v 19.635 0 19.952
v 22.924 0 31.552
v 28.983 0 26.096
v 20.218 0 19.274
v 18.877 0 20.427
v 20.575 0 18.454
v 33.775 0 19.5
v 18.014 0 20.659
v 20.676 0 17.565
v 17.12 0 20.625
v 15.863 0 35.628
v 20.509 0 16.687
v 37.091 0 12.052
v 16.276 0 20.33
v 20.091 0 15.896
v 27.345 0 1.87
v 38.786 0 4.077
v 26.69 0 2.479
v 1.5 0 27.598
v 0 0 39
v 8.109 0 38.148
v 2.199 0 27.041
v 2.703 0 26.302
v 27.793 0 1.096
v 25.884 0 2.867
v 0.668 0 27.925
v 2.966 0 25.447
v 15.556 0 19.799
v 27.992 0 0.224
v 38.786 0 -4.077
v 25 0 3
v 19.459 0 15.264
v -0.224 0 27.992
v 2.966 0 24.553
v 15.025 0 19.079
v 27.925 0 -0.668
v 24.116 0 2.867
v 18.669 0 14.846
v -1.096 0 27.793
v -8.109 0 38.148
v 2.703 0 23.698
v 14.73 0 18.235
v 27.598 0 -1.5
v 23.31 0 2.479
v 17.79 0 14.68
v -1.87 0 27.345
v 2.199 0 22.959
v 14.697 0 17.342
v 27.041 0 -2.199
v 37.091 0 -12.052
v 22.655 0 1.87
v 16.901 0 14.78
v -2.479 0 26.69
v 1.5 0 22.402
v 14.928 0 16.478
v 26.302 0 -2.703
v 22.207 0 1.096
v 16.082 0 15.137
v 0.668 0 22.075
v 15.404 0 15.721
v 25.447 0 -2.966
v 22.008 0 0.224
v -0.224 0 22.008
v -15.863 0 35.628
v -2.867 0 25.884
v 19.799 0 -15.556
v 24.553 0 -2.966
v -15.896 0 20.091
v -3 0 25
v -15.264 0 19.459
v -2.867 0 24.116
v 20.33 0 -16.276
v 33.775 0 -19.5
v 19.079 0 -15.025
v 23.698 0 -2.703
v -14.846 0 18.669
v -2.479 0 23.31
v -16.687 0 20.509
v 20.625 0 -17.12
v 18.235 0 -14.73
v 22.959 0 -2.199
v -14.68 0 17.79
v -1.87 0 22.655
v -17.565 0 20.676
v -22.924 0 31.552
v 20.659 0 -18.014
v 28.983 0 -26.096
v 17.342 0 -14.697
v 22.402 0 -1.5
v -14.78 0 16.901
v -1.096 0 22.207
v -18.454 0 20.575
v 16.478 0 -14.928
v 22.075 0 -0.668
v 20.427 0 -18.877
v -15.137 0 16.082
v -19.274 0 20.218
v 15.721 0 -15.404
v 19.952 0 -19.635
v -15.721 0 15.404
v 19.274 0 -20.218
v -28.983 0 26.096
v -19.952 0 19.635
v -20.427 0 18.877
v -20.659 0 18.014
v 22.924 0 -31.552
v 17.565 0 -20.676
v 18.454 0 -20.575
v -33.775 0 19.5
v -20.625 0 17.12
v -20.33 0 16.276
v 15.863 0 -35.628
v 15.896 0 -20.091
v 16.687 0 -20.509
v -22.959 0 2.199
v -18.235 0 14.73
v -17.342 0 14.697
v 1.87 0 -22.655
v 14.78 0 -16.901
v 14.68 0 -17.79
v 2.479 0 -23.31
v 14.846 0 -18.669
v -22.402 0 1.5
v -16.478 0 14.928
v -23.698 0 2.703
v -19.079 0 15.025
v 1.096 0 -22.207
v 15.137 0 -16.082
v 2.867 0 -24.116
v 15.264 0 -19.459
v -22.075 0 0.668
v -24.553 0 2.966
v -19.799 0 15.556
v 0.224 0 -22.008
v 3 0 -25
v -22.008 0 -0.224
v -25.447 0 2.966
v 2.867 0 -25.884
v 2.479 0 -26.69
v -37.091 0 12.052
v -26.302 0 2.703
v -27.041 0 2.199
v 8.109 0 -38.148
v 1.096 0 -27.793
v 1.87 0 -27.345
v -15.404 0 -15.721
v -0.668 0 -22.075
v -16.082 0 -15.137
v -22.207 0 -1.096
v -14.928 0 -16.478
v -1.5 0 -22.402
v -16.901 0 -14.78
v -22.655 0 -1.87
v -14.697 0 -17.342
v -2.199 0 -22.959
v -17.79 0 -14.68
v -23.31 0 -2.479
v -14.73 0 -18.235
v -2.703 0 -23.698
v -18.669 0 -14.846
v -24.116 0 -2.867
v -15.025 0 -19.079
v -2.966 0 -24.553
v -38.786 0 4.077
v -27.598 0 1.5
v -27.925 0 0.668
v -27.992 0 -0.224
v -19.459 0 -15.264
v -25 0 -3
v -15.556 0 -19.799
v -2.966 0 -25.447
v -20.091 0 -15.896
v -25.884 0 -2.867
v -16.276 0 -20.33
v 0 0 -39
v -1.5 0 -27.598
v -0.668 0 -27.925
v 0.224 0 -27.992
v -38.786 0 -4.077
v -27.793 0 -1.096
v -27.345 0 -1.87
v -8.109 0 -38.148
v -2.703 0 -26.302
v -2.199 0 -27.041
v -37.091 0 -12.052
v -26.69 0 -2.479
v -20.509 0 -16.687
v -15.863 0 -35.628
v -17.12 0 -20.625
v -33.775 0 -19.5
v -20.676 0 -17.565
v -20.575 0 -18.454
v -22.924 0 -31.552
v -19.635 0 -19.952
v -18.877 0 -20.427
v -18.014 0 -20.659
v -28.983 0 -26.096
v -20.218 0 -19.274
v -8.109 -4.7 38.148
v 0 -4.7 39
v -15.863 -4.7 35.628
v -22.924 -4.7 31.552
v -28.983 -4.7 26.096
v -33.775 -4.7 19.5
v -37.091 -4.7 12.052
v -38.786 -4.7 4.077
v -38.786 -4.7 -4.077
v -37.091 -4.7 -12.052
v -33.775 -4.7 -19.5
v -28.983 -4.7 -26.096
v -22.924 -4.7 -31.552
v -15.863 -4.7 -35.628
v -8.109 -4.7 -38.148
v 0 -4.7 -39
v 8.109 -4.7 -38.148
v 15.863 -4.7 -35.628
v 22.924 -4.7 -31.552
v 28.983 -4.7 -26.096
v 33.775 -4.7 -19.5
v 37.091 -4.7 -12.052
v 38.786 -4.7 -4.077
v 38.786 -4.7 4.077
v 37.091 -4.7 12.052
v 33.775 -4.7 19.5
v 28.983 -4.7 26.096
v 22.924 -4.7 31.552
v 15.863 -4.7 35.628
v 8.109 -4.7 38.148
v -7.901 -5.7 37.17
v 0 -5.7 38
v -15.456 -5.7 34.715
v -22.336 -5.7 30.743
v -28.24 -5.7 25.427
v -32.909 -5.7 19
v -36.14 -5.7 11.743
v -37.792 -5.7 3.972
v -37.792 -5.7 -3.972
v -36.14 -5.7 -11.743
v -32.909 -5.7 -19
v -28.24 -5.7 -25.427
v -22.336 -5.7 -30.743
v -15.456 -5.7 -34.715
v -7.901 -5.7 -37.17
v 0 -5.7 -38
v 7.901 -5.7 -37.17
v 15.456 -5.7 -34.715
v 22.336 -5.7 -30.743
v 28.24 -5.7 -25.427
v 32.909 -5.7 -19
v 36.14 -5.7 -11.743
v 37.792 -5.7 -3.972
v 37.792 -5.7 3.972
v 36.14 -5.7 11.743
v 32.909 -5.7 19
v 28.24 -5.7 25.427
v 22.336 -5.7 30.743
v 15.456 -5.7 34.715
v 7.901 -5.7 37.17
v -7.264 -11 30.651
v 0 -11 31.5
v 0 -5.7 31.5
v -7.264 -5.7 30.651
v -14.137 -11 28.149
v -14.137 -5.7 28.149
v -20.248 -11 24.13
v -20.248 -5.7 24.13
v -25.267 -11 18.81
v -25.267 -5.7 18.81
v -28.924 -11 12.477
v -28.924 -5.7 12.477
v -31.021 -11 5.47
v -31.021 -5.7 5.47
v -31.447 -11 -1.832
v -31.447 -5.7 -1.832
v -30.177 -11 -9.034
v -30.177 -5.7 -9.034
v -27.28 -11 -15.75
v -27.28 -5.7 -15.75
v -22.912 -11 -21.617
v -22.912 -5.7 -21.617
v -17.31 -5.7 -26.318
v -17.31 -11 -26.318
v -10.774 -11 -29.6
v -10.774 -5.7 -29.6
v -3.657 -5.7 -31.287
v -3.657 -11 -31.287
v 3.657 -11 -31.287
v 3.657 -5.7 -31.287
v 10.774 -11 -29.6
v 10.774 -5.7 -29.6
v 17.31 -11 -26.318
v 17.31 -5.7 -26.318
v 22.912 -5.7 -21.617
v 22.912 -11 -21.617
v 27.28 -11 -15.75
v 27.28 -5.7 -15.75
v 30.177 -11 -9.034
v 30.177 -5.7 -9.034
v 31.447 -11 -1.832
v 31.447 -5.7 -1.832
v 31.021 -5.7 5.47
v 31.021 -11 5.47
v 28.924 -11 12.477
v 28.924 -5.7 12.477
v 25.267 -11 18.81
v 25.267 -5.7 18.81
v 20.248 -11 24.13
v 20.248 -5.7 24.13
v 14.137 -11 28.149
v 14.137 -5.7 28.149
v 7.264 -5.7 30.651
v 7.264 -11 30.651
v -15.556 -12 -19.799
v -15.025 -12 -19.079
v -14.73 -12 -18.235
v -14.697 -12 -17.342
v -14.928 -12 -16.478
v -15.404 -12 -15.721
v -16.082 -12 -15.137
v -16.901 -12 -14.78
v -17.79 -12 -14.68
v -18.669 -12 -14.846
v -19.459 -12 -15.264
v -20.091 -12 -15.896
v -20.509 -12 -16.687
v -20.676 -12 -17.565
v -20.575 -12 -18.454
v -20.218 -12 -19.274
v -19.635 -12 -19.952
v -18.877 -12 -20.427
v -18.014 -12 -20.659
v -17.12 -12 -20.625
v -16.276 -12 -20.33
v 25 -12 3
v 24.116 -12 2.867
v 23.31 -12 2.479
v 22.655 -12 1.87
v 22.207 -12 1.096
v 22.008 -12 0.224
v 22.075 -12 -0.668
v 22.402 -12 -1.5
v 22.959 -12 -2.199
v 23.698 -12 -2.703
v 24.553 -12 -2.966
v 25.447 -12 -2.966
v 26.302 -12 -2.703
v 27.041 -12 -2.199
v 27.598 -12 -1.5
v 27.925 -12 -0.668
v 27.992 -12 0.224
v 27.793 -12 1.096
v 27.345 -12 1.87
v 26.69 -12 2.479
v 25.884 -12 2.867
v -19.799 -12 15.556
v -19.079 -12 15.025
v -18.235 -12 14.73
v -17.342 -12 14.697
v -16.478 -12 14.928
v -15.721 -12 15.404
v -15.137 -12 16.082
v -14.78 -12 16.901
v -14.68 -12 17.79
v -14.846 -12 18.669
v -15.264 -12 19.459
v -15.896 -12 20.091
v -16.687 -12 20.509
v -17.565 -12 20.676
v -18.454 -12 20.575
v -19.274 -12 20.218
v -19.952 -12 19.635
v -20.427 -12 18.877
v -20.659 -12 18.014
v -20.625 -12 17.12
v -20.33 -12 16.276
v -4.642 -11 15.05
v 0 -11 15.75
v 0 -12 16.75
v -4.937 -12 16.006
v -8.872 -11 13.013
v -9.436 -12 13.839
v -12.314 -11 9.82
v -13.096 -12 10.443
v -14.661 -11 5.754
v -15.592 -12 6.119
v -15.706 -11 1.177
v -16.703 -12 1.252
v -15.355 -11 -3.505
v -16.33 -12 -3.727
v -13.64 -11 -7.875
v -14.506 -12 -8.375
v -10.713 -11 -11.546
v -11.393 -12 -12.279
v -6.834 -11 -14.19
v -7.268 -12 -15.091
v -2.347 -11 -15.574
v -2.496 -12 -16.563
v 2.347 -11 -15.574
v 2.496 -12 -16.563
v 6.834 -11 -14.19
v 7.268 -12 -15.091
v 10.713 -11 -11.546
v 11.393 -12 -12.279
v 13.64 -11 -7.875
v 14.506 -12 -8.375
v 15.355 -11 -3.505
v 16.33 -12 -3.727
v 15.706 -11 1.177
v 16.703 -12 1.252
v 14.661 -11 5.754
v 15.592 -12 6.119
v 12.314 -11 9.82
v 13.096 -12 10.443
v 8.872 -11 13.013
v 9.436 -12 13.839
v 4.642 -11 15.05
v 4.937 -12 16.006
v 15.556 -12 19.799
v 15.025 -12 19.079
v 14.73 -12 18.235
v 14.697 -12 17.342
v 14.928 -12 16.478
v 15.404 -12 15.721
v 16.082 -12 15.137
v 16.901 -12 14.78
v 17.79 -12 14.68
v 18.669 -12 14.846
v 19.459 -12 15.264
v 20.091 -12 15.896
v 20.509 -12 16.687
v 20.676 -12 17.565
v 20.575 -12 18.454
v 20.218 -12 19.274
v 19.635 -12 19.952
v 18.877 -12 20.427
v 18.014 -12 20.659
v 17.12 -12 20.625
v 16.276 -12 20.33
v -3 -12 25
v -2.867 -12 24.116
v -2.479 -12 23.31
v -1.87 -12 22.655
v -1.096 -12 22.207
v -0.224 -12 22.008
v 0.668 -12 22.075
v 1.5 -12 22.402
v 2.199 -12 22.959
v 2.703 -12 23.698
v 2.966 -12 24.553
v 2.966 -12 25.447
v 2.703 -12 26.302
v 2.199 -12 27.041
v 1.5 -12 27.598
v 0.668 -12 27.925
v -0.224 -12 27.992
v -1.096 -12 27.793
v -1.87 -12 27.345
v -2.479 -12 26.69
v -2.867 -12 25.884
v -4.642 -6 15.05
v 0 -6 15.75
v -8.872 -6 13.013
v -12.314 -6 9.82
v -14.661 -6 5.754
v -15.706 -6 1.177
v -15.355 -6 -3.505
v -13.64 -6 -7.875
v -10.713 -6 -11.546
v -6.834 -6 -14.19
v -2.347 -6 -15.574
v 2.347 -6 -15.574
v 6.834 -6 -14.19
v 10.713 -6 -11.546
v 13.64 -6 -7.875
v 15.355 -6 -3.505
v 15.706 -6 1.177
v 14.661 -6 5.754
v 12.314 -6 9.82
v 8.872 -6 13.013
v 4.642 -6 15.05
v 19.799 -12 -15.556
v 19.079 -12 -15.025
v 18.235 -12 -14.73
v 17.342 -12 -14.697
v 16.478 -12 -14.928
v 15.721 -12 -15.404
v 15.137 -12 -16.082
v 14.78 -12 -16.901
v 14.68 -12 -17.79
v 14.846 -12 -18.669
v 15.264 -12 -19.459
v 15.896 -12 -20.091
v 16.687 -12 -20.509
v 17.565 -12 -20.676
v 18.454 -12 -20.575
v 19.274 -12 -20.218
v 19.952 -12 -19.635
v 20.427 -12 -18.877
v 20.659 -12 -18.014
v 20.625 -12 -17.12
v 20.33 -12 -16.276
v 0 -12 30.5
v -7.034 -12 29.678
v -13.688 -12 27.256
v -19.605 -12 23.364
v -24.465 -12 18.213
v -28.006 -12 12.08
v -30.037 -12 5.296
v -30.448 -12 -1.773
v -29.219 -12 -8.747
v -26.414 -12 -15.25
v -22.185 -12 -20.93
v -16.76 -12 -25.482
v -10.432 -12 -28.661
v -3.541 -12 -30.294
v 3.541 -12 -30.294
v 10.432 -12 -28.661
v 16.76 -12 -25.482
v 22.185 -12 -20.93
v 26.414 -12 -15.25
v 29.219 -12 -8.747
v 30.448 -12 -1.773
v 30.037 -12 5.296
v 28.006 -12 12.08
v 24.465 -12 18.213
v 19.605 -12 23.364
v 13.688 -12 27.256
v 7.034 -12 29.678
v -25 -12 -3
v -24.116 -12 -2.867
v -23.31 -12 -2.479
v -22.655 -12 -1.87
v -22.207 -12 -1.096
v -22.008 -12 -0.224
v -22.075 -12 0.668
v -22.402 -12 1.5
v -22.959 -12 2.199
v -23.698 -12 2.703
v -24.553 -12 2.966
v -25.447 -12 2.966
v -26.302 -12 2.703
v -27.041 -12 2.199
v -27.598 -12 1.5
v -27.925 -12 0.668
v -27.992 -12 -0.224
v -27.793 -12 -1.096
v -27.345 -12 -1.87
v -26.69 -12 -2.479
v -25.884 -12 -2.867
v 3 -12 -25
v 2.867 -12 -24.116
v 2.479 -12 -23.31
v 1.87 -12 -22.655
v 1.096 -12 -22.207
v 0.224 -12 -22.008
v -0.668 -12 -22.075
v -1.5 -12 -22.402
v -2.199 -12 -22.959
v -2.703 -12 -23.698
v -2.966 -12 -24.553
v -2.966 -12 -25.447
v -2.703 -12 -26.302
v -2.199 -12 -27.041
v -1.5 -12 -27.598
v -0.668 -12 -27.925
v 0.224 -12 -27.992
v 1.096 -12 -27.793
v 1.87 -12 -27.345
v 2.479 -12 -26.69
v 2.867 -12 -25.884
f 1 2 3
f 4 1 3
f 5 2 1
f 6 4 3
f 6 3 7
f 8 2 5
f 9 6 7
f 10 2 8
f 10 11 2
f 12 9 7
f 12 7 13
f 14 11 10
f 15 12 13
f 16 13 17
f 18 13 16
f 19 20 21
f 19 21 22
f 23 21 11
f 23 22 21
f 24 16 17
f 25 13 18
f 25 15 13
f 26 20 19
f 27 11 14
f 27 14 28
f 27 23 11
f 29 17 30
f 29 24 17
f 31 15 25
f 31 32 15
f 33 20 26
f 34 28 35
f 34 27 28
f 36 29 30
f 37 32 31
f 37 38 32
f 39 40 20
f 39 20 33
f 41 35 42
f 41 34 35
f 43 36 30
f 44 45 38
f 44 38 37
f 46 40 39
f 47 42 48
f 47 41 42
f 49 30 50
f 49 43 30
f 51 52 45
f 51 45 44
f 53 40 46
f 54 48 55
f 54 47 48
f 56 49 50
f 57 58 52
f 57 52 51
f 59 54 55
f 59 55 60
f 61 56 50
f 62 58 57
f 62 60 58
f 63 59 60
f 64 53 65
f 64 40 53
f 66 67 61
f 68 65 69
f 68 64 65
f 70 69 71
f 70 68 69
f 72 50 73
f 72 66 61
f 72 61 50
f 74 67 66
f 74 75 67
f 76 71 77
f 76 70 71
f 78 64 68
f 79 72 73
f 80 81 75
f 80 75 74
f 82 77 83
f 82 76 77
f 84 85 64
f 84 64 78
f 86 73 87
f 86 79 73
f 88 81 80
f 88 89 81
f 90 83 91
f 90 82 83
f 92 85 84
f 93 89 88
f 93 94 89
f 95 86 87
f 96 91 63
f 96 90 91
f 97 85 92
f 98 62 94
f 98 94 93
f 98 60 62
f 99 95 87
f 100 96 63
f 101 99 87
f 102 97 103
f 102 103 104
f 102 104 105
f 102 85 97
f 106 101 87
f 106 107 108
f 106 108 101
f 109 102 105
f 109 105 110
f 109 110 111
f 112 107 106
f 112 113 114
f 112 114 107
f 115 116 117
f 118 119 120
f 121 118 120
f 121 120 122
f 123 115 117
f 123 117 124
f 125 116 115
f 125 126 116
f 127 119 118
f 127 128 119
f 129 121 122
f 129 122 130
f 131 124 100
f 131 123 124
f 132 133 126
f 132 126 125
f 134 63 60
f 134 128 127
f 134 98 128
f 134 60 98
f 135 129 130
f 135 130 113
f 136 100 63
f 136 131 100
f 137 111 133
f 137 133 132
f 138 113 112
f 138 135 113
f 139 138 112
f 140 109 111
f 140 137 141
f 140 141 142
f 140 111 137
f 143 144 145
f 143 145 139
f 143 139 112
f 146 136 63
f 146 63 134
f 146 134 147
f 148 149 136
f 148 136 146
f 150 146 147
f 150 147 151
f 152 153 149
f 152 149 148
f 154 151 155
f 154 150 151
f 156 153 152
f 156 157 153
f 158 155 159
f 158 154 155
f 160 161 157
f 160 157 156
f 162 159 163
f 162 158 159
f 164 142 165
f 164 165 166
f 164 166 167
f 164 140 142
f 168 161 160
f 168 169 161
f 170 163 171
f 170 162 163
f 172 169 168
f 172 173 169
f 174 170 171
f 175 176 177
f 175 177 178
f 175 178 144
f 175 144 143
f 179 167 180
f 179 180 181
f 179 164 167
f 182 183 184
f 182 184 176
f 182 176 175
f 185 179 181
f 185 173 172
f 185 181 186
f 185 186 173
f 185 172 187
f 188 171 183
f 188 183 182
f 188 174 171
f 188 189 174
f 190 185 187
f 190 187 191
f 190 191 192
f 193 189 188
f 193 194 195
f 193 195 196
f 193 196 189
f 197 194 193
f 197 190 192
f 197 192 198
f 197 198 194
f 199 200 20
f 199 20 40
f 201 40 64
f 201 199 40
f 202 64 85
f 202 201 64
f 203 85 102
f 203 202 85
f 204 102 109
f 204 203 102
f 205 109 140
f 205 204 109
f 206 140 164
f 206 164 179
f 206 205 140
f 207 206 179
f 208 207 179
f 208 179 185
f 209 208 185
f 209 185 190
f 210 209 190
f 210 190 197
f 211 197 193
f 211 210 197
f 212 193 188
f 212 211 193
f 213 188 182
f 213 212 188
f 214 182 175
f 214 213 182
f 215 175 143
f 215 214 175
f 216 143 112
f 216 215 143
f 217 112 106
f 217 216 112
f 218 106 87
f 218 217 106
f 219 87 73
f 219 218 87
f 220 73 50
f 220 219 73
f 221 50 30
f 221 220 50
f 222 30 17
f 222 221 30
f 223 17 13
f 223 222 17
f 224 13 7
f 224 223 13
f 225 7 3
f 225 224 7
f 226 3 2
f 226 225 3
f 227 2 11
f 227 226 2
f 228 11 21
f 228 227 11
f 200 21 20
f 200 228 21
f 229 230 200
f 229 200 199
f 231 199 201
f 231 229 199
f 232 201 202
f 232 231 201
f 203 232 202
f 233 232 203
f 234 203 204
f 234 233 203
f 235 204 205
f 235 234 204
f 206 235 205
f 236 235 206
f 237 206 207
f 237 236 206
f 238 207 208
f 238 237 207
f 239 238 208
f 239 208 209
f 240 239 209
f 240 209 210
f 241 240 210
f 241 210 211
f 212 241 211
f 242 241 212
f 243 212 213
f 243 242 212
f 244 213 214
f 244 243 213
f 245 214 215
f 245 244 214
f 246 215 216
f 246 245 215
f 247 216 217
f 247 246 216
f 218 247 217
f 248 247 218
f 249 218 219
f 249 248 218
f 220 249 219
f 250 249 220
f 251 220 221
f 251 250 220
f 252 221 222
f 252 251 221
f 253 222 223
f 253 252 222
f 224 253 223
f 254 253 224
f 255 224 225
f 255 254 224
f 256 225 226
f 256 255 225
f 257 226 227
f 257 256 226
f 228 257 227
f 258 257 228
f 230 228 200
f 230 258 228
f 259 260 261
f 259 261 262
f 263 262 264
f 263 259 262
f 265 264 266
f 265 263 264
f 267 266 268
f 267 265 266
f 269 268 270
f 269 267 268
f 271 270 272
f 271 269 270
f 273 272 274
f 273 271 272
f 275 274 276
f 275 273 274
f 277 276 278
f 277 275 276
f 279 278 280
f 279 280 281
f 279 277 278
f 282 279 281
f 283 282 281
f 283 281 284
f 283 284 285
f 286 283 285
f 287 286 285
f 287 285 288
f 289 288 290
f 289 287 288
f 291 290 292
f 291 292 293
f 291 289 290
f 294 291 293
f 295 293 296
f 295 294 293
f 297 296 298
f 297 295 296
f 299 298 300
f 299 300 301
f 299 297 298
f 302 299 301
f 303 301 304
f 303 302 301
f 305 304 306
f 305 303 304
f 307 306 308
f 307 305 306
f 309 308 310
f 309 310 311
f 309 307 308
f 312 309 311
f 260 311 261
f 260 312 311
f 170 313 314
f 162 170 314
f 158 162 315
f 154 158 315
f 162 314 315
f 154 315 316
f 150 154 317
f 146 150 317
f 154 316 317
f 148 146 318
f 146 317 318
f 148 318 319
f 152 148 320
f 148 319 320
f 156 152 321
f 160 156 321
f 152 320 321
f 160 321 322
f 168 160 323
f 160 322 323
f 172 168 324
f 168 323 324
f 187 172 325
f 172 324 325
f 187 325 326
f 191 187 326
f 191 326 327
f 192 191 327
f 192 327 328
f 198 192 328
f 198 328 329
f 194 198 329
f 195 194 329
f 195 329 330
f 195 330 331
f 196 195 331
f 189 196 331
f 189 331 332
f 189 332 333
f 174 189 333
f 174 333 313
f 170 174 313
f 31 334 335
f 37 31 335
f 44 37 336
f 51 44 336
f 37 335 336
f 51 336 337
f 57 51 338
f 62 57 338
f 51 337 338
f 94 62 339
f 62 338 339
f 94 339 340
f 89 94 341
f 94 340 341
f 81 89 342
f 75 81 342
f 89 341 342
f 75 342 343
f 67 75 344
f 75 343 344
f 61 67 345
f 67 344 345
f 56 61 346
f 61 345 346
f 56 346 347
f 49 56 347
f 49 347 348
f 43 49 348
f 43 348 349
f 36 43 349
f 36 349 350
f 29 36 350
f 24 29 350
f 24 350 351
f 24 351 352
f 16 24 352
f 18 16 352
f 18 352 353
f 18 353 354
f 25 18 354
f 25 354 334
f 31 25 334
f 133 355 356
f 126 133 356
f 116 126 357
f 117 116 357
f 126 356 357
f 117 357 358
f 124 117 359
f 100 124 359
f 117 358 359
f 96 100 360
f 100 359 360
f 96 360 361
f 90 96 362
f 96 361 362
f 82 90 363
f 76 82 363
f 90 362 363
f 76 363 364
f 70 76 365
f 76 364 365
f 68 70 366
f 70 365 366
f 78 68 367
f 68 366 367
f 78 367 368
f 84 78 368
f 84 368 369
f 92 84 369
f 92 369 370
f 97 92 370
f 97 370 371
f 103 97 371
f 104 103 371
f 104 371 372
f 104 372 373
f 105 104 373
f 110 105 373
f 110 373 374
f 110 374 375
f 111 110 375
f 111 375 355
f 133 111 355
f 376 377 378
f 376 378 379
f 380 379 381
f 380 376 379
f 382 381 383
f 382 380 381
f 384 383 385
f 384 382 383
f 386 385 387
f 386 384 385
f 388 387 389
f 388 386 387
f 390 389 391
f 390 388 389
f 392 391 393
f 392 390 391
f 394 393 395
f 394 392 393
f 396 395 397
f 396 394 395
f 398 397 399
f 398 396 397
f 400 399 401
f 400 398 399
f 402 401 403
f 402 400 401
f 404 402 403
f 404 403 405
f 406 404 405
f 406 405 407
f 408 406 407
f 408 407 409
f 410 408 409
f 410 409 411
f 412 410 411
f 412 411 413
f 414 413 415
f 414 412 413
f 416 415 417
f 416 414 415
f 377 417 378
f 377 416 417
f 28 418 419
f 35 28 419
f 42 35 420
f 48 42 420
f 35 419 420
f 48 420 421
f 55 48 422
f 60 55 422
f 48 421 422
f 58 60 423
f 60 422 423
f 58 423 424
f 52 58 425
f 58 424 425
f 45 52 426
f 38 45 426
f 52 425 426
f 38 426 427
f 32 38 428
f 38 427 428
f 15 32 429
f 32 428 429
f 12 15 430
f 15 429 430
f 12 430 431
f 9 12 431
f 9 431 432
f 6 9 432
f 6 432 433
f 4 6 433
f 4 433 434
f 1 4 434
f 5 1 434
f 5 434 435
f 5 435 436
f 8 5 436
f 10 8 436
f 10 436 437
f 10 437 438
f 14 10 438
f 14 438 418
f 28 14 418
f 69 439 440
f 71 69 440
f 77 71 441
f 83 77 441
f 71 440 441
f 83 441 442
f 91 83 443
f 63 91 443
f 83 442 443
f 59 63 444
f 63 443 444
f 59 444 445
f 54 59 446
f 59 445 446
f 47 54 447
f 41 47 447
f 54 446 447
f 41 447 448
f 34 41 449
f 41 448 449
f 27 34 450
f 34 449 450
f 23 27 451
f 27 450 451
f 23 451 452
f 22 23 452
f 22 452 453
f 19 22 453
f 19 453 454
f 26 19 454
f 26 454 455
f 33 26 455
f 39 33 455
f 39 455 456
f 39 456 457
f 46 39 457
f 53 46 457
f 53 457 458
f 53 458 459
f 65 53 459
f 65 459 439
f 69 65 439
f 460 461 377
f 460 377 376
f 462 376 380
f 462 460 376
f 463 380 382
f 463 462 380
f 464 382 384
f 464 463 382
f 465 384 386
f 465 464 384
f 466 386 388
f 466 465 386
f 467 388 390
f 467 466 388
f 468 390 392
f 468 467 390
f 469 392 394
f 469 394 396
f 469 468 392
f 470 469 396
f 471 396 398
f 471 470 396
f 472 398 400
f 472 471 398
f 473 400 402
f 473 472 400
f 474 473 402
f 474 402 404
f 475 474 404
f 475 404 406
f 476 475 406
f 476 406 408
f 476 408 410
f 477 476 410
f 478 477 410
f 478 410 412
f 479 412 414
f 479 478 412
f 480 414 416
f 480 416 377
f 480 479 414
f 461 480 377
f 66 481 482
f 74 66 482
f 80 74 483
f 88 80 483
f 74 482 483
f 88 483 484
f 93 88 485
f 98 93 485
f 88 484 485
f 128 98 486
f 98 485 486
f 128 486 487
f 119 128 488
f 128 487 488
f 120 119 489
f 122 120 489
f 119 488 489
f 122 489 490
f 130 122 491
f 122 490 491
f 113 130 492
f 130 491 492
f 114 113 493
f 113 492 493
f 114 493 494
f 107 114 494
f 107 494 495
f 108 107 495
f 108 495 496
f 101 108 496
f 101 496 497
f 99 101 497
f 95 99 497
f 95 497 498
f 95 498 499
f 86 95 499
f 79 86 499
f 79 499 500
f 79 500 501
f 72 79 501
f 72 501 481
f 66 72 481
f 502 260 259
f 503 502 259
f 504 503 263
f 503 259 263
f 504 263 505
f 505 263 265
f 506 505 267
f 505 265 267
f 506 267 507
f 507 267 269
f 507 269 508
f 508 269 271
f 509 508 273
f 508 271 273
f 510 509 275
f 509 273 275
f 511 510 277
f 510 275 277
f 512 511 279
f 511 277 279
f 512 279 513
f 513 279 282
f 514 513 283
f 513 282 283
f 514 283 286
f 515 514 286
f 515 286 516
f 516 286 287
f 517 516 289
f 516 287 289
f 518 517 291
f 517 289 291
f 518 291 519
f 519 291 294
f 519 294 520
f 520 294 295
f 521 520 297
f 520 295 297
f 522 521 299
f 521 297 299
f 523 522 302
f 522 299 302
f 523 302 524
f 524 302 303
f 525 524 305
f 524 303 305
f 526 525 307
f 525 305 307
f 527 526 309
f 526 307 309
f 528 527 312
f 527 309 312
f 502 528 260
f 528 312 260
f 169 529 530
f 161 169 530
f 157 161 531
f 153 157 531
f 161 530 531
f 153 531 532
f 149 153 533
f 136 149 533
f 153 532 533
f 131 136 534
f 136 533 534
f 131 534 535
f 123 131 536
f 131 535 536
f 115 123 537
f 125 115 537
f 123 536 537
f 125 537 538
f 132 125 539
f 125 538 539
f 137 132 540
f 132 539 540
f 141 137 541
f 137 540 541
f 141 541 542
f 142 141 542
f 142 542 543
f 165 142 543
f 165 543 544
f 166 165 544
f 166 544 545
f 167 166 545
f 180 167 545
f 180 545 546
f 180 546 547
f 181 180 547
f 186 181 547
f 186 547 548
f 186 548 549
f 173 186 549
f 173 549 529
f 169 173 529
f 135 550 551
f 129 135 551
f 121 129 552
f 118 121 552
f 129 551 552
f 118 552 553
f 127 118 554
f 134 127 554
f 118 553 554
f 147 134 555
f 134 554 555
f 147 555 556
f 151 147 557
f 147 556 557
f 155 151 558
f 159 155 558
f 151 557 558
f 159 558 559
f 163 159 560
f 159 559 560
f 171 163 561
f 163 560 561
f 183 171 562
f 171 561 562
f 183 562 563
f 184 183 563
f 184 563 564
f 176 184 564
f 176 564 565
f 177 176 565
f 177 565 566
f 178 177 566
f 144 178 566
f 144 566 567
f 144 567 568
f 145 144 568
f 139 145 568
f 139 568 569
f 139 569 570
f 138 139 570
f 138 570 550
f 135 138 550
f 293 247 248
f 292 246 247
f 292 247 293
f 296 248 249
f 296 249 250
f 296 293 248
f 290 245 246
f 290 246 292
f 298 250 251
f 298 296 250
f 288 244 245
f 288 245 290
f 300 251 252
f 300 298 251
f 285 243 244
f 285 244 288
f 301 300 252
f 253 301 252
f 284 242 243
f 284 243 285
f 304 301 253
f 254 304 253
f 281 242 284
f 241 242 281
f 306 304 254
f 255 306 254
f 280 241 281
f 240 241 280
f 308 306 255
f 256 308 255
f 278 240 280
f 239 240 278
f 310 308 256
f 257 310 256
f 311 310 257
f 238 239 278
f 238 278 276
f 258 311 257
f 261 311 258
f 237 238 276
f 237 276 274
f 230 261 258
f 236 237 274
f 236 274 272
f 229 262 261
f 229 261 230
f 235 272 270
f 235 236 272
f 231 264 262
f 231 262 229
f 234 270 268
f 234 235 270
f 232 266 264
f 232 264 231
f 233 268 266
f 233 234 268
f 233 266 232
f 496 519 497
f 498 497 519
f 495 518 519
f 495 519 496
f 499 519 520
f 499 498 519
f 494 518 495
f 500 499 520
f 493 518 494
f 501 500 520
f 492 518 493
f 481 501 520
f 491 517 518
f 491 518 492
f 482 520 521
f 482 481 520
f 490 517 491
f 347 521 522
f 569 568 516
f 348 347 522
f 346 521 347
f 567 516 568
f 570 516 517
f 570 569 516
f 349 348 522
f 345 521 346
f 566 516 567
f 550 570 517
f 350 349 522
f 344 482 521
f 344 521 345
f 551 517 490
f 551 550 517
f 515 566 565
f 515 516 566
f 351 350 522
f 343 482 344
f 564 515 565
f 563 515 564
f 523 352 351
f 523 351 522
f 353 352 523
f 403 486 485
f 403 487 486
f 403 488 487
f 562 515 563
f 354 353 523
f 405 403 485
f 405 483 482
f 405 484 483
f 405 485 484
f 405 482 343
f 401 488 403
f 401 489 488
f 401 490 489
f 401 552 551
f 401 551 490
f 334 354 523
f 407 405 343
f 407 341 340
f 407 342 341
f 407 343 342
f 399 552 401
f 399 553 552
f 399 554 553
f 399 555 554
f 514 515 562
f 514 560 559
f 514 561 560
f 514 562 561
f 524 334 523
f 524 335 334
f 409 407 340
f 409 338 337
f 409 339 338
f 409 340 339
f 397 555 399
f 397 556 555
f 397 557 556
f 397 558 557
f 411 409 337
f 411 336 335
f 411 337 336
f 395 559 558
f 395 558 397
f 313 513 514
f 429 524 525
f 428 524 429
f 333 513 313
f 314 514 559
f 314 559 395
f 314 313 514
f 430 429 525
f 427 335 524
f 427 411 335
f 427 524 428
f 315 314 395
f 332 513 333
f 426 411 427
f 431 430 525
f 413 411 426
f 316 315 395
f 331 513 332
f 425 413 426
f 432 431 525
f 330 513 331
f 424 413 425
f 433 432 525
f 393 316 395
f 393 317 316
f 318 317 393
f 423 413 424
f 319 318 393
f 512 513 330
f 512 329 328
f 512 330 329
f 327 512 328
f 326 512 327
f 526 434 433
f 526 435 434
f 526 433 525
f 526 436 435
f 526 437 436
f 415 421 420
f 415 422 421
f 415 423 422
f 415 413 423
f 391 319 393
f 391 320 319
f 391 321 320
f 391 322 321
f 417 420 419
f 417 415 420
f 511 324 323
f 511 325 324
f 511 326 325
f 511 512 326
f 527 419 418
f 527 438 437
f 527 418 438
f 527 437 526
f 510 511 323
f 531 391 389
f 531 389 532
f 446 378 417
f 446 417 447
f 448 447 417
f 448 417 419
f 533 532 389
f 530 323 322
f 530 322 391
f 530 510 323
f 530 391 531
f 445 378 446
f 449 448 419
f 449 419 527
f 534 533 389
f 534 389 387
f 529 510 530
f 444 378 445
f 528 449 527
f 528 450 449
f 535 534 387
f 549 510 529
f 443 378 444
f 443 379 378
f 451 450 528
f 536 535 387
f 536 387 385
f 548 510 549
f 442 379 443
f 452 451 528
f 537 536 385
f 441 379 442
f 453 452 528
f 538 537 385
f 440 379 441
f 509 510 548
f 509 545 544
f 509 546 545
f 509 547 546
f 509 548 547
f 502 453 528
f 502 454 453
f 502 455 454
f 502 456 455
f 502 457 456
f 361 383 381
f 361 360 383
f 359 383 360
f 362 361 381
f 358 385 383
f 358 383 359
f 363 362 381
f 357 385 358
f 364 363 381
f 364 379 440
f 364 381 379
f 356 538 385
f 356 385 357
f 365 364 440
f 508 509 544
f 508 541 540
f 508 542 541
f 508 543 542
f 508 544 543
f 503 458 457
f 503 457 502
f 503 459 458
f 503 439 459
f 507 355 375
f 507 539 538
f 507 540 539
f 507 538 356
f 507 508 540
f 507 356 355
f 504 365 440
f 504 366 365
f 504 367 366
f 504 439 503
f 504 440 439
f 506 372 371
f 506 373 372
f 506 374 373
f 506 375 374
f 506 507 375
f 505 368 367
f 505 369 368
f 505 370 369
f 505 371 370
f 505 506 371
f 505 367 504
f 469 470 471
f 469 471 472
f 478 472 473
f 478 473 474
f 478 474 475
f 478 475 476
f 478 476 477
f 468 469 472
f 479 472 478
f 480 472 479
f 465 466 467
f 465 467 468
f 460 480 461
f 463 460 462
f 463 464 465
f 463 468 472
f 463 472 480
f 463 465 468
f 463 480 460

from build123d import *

# Parameters (mm, degrees)
F3_D            = 6
F3_COPIES_COUNT = 8
F4_SIZE         = 1


# Not quite as in the source:
# - a pattern or mirror of a feature is missing from the dataset's text; its kind, count and spacing are read off the source's solid


with BuildPart() as f1:
    # F0 (on Right) → F1 (revolve)
    with BuildSketch(Plane.YZ):
        Polygon((-6, 0), (0, 0), (0, 39), (-5.7, 39), (-5.7, 31.5), (-12, 31.5), (-12, 15.75), (-6, 15.75), align=None)
    revolve(axis=Axis((0, -15.2627385695, 0), (0, -1, 0)))

    # F3 (through all)
    with Locations(Plane(origin=(0, 0, 0), x_dir=(1, 0, 0), z_dir=(0, 1, 0))):
        with Locations((0, -25)):
            f3 = Hole(F3_D / 2)

    # F3_copies: F3 ×8 about axis
    f3_copies_axis = Axis((0, 0, 0), (0, 1, 0))
    for i in range(1, F3_COPIES_COUNT):
        add(f3.rotate(f3_copies_axis, i * 360 / F3_COPIES_COUNT), mode=Mode.SUBTRACT)

    # F4
    f4_edges = [f1.edges().sort_by_distance(p)[0] for p in [
        (0, -12, -15.75),
        (0, -12, -31.5),
        (0, -5.7, -39),
    ]]
    chamfer(f4_edges, length=F4_SIZE)


solid = f1.part
